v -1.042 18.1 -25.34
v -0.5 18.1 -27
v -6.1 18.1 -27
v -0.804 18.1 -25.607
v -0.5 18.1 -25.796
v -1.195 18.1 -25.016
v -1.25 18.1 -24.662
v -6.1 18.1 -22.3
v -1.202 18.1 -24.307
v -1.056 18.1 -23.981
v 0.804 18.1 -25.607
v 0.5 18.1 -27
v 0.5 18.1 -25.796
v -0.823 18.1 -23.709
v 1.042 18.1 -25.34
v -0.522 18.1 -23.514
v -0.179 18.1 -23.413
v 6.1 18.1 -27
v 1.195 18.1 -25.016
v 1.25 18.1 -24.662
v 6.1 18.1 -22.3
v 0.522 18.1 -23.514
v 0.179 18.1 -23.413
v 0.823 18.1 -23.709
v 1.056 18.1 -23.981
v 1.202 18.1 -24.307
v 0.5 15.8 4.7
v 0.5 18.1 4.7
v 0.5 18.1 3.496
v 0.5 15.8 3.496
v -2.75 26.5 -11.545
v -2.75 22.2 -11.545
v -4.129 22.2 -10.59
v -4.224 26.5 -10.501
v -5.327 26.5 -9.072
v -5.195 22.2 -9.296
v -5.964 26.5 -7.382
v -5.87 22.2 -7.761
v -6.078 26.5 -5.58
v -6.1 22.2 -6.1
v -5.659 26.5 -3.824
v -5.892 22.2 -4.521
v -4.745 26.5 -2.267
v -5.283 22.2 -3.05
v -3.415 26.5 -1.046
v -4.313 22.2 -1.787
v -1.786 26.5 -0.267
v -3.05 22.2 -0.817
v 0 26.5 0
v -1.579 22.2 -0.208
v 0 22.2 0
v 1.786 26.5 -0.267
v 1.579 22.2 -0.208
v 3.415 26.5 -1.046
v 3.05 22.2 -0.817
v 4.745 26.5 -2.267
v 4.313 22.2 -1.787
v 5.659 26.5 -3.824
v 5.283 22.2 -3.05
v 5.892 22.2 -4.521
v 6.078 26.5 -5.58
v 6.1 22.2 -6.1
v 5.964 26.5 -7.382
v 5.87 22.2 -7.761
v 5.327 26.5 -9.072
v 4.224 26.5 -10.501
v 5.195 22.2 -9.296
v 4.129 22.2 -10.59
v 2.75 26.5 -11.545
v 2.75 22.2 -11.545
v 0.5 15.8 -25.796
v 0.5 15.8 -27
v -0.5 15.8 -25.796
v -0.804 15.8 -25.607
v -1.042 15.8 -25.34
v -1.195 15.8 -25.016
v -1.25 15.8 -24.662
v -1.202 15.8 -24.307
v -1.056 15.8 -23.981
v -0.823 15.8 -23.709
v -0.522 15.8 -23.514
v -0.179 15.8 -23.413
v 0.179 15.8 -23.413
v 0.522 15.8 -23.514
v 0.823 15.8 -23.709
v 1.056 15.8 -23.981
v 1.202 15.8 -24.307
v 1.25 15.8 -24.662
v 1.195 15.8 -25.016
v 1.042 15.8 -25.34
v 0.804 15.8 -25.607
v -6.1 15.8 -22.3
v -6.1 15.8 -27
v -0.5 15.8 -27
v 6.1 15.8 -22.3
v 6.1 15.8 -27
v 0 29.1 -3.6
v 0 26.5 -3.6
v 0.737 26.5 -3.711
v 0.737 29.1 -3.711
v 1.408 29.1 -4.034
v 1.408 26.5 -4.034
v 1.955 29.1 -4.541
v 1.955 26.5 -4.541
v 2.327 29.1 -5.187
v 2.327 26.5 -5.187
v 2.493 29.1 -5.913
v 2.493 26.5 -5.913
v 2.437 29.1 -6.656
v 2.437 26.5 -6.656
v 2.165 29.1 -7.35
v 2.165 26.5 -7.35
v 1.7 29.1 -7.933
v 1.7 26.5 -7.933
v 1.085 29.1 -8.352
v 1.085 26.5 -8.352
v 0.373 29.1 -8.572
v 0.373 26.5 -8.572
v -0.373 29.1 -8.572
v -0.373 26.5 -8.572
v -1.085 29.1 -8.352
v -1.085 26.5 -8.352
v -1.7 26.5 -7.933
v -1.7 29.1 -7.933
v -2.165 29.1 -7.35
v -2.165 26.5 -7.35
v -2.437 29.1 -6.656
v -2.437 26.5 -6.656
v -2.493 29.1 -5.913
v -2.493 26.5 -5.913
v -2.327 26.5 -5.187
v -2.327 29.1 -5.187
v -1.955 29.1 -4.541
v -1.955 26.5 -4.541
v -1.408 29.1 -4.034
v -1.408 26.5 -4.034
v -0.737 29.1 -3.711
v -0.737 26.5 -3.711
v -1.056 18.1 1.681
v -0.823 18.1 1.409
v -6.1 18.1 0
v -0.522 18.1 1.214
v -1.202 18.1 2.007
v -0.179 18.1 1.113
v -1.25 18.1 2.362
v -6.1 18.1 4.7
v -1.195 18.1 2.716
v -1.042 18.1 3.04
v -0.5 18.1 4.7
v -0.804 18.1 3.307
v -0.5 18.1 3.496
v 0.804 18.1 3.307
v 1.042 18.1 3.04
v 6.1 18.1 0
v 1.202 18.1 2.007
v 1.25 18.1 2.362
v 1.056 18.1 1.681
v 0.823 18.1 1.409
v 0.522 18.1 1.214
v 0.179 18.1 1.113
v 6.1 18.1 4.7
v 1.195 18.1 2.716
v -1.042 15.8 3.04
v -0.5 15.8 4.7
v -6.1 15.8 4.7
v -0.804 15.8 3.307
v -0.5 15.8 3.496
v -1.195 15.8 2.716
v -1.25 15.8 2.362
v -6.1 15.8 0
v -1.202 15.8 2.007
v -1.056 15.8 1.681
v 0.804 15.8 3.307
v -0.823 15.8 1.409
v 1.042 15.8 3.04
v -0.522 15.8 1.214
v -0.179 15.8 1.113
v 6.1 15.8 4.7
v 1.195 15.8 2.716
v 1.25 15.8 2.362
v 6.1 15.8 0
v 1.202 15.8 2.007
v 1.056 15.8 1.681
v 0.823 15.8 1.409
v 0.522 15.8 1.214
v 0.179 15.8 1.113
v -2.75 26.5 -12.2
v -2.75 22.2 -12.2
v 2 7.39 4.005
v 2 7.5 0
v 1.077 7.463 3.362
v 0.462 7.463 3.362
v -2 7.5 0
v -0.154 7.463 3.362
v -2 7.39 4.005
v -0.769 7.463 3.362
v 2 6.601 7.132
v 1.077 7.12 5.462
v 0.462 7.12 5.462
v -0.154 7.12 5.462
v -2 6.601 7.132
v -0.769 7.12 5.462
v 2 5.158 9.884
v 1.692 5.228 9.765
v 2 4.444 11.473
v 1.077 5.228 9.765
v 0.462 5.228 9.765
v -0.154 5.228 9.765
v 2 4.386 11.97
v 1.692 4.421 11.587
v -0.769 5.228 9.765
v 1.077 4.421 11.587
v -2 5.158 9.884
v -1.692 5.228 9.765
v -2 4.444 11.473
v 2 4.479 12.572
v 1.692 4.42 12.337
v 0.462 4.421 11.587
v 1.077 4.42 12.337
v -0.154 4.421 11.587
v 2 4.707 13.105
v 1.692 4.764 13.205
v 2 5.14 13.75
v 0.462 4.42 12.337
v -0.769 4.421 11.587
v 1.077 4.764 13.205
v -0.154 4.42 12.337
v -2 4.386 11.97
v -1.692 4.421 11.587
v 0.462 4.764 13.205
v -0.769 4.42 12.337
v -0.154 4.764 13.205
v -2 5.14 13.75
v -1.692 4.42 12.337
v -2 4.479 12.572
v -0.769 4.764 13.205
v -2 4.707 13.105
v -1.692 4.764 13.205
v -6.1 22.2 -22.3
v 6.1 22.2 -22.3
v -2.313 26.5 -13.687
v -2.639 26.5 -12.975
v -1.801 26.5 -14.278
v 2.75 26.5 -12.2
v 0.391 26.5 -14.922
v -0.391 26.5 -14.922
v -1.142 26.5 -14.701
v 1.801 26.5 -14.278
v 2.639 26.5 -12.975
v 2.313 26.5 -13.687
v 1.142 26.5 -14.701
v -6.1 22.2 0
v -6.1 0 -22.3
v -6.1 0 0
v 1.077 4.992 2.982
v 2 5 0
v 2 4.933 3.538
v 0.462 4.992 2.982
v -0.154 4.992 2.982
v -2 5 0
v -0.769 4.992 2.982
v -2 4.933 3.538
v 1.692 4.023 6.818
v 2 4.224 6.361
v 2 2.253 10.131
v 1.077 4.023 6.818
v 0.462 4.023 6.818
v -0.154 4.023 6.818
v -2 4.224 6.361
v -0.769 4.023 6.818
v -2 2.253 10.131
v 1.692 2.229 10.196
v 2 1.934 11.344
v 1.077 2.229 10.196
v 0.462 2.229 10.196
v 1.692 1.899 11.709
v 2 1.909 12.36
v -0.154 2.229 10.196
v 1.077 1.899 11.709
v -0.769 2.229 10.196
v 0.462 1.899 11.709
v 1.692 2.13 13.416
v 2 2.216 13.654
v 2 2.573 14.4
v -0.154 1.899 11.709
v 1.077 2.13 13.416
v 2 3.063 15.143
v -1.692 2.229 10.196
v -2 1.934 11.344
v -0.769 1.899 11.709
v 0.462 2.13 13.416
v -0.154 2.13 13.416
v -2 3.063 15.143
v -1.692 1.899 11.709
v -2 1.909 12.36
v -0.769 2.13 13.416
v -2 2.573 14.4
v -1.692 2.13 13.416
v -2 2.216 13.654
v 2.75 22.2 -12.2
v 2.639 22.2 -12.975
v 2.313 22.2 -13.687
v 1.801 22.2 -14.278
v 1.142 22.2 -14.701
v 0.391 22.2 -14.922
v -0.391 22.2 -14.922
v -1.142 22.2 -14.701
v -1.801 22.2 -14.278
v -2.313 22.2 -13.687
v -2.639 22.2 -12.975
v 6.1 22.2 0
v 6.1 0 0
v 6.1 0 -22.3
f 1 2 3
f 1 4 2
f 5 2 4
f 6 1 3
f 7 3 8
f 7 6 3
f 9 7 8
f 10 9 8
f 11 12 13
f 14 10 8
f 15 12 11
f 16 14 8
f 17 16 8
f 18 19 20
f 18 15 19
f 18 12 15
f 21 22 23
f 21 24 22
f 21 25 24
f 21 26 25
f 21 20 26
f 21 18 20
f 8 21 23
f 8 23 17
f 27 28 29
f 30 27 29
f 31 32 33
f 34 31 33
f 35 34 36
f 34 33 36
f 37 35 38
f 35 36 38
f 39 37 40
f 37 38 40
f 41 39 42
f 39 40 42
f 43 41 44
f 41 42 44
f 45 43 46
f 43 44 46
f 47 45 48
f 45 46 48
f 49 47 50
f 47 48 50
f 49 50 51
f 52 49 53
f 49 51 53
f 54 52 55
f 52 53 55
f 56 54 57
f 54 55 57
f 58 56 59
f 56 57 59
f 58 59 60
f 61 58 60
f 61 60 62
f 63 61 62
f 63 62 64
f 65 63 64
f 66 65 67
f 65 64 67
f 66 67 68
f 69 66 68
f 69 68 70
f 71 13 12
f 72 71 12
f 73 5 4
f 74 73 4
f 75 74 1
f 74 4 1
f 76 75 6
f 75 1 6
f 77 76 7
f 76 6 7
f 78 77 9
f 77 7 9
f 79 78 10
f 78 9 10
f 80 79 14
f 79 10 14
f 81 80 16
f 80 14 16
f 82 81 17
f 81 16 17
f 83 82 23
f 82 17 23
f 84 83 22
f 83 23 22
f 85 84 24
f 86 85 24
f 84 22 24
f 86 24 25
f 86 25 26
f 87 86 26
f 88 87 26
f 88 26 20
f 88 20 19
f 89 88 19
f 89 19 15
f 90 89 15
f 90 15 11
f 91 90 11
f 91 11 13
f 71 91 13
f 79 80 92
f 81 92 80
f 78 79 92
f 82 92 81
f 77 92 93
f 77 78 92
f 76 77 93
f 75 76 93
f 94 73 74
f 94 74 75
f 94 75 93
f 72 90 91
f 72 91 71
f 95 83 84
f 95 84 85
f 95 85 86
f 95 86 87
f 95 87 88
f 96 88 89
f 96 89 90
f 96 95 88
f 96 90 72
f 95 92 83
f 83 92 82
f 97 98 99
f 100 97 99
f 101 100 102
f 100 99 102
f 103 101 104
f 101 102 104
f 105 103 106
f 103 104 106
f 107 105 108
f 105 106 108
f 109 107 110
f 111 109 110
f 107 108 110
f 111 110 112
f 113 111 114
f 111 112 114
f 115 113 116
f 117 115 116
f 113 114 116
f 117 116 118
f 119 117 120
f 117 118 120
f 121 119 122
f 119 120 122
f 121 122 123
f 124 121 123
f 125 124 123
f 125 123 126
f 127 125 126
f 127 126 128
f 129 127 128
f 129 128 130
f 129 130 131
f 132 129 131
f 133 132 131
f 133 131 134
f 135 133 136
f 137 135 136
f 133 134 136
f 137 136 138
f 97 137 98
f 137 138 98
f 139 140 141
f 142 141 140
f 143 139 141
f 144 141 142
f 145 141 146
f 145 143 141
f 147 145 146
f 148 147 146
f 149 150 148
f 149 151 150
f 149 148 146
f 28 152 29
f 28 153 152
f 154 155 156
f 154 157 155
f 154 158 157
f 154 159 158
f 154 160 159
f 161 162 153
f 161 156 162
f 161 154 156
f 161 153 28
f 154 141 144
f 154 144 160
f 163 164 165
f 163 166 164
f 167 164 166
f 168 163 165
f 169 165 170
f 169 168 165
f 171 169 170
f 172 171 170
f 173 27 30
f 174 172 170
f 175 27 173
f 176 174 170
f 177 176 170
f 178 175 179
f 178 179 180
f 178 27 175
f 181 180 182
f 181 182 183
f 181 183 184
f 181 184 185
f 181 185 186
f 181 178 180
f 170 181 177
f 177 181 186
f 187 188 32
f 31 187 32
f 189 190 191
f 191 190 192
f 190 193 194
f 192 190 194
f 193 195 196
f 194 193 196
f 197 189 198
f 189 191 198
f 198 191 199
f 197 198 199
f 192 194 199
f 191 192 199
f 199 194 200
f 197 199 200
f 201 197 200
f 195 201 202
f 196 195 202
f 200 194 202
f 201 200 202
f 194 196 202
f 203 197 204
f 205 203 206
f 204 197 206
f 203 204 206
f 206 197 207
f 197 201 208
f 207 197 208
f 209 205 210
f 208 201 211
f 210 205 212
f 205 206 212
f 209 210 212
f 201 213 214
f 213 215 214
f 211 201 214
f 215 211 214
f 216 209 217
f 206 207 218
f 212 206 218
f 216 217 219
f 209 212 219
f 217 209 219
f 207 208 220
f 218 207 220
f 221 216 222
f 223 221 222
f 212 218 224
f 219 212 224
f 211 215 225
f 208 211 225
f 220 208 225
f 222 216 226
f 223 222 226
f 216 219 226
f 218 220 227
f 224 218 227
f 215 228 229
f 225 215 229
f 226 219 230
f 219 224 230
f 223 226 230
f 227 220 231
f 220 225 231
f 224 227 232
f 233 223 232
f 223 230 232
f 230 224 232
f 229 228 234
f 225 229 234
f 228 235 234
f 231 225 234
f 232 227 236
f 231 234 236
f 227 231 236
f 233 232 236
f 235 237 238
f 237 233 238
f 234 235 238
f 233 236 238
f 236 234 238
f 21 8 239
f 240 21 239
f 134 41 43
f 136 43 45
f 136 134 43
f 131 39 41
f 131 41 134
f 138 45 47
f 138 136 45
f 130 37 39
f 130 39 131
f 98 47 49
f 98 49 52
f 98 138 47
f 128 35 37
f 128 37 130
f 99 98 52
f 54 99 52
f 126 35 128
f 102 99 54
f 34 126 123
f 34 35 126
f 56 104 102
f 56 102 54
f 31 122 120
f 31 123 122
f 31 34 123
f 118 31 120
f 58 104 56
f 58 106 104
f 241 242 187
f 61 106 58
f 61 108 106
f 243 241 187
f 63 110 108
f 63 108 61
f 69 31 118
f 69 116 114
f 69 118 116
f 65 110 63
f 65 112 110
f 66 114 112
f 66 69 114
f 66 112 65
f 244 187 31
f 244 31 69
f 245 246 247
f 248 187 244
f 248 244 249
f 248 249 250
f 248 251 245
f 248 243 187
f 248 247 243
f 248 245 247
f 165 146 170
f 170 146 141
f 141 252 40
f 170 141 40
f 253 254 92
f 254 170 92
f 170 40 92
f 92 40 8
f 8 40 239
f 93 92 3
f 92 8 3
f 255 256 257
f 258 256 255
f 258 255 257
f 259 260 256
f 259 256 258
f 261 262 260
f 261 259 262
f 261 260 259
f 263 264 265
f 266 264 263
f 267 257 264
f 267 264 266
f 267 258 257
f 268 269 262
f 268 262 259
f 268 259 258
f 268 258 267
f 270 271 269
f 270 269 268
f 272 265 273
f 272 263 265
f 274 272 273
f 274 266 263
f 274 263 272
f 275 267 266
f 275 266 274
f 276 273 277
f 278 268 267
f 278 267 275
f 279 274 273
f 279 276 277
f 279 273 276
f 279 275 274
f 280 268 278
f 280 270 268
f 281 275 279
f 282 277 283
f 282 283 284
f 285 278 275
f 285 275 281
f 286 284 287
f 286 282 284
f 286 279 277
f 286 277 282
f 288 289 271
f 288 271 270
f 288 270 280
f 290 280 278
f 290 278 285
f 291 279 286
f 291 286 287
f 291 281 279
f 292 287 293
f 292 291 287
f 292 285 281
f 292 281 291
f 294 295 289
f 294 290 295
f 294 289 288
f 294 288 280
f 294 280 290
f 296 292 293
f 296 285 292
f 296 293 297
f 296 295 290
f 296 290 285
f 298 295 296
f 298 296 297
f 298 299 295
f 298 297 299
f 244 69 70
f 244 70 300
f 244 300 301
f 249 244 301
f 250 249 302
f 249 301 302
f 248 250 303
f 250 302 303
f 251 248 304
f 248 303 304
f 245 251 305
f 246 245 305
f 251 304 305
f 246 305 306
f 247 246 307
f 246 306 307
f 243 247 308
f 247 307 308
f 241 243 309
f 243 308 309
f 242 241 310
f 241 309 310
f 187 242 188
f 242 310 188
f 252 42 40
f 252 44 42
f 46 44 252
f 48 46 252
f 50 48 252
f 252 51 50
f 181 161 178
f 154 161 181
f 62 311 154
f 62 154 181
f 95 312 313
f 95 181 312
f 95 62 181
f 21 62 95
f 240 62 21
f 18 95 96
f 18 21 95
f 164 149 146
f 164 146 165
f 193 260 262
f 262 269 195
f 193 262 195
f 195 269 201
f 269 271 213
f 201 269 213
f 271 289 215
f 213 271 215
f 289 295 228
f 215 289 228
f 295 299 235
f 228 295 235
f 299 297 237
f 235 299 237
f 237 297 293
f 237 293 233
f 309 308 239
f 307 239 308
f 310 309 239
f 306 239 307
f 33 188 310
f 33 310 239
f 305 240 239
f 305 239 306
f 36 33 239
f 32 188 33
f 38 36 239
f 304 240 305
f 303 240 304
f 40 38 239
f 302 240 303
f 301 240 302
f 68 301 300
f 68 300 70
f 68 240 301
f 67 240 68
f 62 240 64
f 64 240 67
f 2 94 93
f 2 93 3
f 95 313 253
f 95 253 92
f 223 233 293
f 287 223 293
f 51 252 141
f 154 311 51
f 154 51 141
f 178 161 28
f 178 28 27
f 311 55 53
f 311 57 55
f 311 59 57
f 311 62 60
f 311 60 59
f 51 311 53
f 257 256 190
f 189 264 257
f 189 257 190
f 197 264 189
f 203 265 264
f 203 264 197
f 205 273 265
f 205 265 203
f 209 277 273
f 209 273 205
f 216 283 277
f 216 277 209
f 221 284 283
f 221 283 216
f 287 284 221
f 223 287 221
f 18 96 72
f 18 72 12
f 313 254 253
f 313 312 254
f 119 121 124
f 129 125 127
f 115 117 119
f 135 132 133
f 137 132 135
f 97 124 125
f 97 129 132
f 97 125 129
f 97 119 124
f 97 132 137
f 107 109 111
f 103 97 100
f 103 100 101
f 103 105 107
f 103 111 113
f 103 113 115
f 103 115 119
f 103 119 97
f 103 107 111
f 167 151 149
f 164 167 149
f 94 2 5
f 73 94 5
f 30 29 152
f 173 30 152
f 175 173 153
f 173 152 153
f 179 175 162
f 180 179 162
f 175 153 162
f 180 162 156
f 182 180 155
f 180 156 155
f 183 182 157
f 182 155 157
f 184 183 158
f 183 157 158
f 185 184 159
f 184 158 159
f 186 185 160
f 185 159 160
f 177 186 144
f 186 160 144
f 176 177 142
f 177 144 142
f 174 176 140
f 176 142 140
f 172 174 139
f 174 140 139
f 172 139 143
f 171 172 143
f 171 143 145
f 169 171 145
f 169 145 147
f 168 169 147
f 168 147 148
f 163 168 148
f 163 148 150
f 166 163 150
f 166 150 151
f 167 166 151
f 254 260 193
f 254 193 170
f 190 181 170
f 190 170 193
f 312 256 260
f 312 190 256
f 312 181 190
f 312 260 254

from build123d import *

# Parameters (mm, degrees)
EXTRUDE_1_DEPTH     = 6.1
EXTRUDE_2_DEPTH     = 4.3
SKETCH_3_R          = 2.5
EXTRUDE_3_DEPTH     = 2.6
SWEEP_START         = -2
SWEEP_1_DEPTH       = 4
CUT_EXTRUDE_1_DEPTH = 3


# Read off the part's stored shape, not the designer's step: По траектории1
with BuildPart() as part:
    # Эскиз1 → Бобышка-Вытянуть1 (new, symmetric)
    with BuildSketch(Plane(origin=(0, 0, 0), x_dir=(0, 0, -1), z_dir=(1, 0, 0))):
        Polygon((0, 0), (22.3, 0), (22.3, 15.8), (27, 15.8), (27, 18.1), (22.3, 18.1), (22.3, 22.2), (0, 22.2), (0, 18.1), (-4.7, 18.1), (-4.7, 15.8), (0, 15.8), align=None)
    extrude(amount=EXTRUDE_1_DEPTH, both=True)

    # Эскиз2 → Бобышка-Вытянуть2 (add)
    with BuildSketch(Plane(origin=(0, 22.2, 0), x_dir=(1, 0, 0), z_dir=(0, 1, 0))):
        with BuildLine():
            Line((-2.75, 12.2), (-2.75, 11.54495179))
            ThreePointArc((-2.75, 11.54495179), (0, 0), (2.75, 11.54495179))
            Line((2.75, 11.54495179), (2.75, 12.2))
            ThreePointArc((2.75, 12.2), (0, 14.95), (-2.75, 12.2))
        make_face()
    extrude(amount=EXTRUDE_2_DEPTH)

    # Эскиз3 → Бобышка-Вытянуть3 (add)
    with BuildSketch(Plane(origin=(0, 26.5, 0), x_dir=(1, 0, 0), z_dir=(0, 1, 0))):
        with Locations(Location((0, 6.1, 0), (0, 0, 270))):
            Circle(SKETCH_3_R)
    extrude(amount=EXTRUDE_3_DEPTH)

    # По траектории1 outline → По траектории1 (add)
    with BuildSketch(Plane.YZ.offset(SWEEP_START)):
        with BuildLine():
            Line((5, 0), (7.5, 0))
            add(Edge.make_bspline(
                [(7.5, 0), (7.55466995, 0.932768751), (7.567397074, 2.054373731), (7.427446861, 3.871339503), (7.144525851, 5.668082774), (6.567191568, 7.327579523), (5.845700953, 8.750774075), (5.129629815, 9.89551827), (4.584016429, 10.917508592), (4.409004277, 11.592638933), (4.374327462, 11.966191087), (4.40728466, 12.331644555), (4.518227027, 12.728854054), (4.738611449, 13.18957707), (4.985731728, 13.5588281), (5.139543938, 13.750446366)],
                knots=[0, 0, 0, 0, 0.166666667, 0.203301869, 0.333333333, 0.5, 0.519938297, 0.625, 0.75, 0.791666667, 0.833333333, 0.875, 0.916666667, 0.958333333, 1, 1, 1, 1], degree=3))
            Line((5.139543938, 13.750446366), (3.063253187, 15.142932171))
            add(Edge.make_bspline(
                [(5, 0), (5.057281604, 0.840170125), (5.073194453, 1.848822262), (4.963561919, 3.425294528), (4.739313637, 4.934487741), (4.312374062, 6.230912608), (3.740083573, 7.399180935), (3.13051994, 8.398930623), (2.368002426, 9.70405156), (1.994241871, 10.907667376), (1.874475502, 11.699413606), (1.900467078, 12.546155788), (2.099949953, 13.416272622), (2.478763958, 14.286542274), (2.848255397, 14.852807038), (3.063253187, 15.142932171)],
                knots=[0, 0, 0, 0, 0.166666667, 0.203301869, 0.333333333, 0.5, 0.519938297, 0.625, 0.75, 0.791666667, 0.833333333, 0.875, 0.916666667, 0.958333333, 1, 1, 1, 1], degree=3))
        make_face()
    extrude(amount=SWEEP_1_DEPTH)

    # Эскиз6 → Вырез-Вытянуть1 (cut)
    with BuildSketch(Plane(origin=(0, 18.1, 0), x_dir=(1, 0, 0), z_dir=(0, 1, 0))):
        with BuildLine():
            Line((-0.5, 27), (-0.5, 25.795643924))
            ThreePointArc((-0.5, 25.795643924), (0, 23.4), (0.5, 25.795643924))
            Line((0.5, 25.795643924), (0.5, 27))
            Line((0.5, 27), (0, 27))
            Line((0, 27), (-0.5, 27))
        make_face()
        with BuildLine():
            Line((0.5, -4.7), (0.5, -3.495643924))
            ThreePointArc((0.5, -3.495643924), (0, -1.1), (-0.5, -3.495643924))
            Line((-0.5, -3.495643924), (-0.5, -4.7))
            Line((-0.5, -4.7), (0, -4.7))
            Line((0, -4.7), (0.5, -4.7))
        make_face()
    extrude(amount=-CUT_EXTRUDE_1_DEPTH, mode=Mode.SUBTRACT)


solid = part.part
